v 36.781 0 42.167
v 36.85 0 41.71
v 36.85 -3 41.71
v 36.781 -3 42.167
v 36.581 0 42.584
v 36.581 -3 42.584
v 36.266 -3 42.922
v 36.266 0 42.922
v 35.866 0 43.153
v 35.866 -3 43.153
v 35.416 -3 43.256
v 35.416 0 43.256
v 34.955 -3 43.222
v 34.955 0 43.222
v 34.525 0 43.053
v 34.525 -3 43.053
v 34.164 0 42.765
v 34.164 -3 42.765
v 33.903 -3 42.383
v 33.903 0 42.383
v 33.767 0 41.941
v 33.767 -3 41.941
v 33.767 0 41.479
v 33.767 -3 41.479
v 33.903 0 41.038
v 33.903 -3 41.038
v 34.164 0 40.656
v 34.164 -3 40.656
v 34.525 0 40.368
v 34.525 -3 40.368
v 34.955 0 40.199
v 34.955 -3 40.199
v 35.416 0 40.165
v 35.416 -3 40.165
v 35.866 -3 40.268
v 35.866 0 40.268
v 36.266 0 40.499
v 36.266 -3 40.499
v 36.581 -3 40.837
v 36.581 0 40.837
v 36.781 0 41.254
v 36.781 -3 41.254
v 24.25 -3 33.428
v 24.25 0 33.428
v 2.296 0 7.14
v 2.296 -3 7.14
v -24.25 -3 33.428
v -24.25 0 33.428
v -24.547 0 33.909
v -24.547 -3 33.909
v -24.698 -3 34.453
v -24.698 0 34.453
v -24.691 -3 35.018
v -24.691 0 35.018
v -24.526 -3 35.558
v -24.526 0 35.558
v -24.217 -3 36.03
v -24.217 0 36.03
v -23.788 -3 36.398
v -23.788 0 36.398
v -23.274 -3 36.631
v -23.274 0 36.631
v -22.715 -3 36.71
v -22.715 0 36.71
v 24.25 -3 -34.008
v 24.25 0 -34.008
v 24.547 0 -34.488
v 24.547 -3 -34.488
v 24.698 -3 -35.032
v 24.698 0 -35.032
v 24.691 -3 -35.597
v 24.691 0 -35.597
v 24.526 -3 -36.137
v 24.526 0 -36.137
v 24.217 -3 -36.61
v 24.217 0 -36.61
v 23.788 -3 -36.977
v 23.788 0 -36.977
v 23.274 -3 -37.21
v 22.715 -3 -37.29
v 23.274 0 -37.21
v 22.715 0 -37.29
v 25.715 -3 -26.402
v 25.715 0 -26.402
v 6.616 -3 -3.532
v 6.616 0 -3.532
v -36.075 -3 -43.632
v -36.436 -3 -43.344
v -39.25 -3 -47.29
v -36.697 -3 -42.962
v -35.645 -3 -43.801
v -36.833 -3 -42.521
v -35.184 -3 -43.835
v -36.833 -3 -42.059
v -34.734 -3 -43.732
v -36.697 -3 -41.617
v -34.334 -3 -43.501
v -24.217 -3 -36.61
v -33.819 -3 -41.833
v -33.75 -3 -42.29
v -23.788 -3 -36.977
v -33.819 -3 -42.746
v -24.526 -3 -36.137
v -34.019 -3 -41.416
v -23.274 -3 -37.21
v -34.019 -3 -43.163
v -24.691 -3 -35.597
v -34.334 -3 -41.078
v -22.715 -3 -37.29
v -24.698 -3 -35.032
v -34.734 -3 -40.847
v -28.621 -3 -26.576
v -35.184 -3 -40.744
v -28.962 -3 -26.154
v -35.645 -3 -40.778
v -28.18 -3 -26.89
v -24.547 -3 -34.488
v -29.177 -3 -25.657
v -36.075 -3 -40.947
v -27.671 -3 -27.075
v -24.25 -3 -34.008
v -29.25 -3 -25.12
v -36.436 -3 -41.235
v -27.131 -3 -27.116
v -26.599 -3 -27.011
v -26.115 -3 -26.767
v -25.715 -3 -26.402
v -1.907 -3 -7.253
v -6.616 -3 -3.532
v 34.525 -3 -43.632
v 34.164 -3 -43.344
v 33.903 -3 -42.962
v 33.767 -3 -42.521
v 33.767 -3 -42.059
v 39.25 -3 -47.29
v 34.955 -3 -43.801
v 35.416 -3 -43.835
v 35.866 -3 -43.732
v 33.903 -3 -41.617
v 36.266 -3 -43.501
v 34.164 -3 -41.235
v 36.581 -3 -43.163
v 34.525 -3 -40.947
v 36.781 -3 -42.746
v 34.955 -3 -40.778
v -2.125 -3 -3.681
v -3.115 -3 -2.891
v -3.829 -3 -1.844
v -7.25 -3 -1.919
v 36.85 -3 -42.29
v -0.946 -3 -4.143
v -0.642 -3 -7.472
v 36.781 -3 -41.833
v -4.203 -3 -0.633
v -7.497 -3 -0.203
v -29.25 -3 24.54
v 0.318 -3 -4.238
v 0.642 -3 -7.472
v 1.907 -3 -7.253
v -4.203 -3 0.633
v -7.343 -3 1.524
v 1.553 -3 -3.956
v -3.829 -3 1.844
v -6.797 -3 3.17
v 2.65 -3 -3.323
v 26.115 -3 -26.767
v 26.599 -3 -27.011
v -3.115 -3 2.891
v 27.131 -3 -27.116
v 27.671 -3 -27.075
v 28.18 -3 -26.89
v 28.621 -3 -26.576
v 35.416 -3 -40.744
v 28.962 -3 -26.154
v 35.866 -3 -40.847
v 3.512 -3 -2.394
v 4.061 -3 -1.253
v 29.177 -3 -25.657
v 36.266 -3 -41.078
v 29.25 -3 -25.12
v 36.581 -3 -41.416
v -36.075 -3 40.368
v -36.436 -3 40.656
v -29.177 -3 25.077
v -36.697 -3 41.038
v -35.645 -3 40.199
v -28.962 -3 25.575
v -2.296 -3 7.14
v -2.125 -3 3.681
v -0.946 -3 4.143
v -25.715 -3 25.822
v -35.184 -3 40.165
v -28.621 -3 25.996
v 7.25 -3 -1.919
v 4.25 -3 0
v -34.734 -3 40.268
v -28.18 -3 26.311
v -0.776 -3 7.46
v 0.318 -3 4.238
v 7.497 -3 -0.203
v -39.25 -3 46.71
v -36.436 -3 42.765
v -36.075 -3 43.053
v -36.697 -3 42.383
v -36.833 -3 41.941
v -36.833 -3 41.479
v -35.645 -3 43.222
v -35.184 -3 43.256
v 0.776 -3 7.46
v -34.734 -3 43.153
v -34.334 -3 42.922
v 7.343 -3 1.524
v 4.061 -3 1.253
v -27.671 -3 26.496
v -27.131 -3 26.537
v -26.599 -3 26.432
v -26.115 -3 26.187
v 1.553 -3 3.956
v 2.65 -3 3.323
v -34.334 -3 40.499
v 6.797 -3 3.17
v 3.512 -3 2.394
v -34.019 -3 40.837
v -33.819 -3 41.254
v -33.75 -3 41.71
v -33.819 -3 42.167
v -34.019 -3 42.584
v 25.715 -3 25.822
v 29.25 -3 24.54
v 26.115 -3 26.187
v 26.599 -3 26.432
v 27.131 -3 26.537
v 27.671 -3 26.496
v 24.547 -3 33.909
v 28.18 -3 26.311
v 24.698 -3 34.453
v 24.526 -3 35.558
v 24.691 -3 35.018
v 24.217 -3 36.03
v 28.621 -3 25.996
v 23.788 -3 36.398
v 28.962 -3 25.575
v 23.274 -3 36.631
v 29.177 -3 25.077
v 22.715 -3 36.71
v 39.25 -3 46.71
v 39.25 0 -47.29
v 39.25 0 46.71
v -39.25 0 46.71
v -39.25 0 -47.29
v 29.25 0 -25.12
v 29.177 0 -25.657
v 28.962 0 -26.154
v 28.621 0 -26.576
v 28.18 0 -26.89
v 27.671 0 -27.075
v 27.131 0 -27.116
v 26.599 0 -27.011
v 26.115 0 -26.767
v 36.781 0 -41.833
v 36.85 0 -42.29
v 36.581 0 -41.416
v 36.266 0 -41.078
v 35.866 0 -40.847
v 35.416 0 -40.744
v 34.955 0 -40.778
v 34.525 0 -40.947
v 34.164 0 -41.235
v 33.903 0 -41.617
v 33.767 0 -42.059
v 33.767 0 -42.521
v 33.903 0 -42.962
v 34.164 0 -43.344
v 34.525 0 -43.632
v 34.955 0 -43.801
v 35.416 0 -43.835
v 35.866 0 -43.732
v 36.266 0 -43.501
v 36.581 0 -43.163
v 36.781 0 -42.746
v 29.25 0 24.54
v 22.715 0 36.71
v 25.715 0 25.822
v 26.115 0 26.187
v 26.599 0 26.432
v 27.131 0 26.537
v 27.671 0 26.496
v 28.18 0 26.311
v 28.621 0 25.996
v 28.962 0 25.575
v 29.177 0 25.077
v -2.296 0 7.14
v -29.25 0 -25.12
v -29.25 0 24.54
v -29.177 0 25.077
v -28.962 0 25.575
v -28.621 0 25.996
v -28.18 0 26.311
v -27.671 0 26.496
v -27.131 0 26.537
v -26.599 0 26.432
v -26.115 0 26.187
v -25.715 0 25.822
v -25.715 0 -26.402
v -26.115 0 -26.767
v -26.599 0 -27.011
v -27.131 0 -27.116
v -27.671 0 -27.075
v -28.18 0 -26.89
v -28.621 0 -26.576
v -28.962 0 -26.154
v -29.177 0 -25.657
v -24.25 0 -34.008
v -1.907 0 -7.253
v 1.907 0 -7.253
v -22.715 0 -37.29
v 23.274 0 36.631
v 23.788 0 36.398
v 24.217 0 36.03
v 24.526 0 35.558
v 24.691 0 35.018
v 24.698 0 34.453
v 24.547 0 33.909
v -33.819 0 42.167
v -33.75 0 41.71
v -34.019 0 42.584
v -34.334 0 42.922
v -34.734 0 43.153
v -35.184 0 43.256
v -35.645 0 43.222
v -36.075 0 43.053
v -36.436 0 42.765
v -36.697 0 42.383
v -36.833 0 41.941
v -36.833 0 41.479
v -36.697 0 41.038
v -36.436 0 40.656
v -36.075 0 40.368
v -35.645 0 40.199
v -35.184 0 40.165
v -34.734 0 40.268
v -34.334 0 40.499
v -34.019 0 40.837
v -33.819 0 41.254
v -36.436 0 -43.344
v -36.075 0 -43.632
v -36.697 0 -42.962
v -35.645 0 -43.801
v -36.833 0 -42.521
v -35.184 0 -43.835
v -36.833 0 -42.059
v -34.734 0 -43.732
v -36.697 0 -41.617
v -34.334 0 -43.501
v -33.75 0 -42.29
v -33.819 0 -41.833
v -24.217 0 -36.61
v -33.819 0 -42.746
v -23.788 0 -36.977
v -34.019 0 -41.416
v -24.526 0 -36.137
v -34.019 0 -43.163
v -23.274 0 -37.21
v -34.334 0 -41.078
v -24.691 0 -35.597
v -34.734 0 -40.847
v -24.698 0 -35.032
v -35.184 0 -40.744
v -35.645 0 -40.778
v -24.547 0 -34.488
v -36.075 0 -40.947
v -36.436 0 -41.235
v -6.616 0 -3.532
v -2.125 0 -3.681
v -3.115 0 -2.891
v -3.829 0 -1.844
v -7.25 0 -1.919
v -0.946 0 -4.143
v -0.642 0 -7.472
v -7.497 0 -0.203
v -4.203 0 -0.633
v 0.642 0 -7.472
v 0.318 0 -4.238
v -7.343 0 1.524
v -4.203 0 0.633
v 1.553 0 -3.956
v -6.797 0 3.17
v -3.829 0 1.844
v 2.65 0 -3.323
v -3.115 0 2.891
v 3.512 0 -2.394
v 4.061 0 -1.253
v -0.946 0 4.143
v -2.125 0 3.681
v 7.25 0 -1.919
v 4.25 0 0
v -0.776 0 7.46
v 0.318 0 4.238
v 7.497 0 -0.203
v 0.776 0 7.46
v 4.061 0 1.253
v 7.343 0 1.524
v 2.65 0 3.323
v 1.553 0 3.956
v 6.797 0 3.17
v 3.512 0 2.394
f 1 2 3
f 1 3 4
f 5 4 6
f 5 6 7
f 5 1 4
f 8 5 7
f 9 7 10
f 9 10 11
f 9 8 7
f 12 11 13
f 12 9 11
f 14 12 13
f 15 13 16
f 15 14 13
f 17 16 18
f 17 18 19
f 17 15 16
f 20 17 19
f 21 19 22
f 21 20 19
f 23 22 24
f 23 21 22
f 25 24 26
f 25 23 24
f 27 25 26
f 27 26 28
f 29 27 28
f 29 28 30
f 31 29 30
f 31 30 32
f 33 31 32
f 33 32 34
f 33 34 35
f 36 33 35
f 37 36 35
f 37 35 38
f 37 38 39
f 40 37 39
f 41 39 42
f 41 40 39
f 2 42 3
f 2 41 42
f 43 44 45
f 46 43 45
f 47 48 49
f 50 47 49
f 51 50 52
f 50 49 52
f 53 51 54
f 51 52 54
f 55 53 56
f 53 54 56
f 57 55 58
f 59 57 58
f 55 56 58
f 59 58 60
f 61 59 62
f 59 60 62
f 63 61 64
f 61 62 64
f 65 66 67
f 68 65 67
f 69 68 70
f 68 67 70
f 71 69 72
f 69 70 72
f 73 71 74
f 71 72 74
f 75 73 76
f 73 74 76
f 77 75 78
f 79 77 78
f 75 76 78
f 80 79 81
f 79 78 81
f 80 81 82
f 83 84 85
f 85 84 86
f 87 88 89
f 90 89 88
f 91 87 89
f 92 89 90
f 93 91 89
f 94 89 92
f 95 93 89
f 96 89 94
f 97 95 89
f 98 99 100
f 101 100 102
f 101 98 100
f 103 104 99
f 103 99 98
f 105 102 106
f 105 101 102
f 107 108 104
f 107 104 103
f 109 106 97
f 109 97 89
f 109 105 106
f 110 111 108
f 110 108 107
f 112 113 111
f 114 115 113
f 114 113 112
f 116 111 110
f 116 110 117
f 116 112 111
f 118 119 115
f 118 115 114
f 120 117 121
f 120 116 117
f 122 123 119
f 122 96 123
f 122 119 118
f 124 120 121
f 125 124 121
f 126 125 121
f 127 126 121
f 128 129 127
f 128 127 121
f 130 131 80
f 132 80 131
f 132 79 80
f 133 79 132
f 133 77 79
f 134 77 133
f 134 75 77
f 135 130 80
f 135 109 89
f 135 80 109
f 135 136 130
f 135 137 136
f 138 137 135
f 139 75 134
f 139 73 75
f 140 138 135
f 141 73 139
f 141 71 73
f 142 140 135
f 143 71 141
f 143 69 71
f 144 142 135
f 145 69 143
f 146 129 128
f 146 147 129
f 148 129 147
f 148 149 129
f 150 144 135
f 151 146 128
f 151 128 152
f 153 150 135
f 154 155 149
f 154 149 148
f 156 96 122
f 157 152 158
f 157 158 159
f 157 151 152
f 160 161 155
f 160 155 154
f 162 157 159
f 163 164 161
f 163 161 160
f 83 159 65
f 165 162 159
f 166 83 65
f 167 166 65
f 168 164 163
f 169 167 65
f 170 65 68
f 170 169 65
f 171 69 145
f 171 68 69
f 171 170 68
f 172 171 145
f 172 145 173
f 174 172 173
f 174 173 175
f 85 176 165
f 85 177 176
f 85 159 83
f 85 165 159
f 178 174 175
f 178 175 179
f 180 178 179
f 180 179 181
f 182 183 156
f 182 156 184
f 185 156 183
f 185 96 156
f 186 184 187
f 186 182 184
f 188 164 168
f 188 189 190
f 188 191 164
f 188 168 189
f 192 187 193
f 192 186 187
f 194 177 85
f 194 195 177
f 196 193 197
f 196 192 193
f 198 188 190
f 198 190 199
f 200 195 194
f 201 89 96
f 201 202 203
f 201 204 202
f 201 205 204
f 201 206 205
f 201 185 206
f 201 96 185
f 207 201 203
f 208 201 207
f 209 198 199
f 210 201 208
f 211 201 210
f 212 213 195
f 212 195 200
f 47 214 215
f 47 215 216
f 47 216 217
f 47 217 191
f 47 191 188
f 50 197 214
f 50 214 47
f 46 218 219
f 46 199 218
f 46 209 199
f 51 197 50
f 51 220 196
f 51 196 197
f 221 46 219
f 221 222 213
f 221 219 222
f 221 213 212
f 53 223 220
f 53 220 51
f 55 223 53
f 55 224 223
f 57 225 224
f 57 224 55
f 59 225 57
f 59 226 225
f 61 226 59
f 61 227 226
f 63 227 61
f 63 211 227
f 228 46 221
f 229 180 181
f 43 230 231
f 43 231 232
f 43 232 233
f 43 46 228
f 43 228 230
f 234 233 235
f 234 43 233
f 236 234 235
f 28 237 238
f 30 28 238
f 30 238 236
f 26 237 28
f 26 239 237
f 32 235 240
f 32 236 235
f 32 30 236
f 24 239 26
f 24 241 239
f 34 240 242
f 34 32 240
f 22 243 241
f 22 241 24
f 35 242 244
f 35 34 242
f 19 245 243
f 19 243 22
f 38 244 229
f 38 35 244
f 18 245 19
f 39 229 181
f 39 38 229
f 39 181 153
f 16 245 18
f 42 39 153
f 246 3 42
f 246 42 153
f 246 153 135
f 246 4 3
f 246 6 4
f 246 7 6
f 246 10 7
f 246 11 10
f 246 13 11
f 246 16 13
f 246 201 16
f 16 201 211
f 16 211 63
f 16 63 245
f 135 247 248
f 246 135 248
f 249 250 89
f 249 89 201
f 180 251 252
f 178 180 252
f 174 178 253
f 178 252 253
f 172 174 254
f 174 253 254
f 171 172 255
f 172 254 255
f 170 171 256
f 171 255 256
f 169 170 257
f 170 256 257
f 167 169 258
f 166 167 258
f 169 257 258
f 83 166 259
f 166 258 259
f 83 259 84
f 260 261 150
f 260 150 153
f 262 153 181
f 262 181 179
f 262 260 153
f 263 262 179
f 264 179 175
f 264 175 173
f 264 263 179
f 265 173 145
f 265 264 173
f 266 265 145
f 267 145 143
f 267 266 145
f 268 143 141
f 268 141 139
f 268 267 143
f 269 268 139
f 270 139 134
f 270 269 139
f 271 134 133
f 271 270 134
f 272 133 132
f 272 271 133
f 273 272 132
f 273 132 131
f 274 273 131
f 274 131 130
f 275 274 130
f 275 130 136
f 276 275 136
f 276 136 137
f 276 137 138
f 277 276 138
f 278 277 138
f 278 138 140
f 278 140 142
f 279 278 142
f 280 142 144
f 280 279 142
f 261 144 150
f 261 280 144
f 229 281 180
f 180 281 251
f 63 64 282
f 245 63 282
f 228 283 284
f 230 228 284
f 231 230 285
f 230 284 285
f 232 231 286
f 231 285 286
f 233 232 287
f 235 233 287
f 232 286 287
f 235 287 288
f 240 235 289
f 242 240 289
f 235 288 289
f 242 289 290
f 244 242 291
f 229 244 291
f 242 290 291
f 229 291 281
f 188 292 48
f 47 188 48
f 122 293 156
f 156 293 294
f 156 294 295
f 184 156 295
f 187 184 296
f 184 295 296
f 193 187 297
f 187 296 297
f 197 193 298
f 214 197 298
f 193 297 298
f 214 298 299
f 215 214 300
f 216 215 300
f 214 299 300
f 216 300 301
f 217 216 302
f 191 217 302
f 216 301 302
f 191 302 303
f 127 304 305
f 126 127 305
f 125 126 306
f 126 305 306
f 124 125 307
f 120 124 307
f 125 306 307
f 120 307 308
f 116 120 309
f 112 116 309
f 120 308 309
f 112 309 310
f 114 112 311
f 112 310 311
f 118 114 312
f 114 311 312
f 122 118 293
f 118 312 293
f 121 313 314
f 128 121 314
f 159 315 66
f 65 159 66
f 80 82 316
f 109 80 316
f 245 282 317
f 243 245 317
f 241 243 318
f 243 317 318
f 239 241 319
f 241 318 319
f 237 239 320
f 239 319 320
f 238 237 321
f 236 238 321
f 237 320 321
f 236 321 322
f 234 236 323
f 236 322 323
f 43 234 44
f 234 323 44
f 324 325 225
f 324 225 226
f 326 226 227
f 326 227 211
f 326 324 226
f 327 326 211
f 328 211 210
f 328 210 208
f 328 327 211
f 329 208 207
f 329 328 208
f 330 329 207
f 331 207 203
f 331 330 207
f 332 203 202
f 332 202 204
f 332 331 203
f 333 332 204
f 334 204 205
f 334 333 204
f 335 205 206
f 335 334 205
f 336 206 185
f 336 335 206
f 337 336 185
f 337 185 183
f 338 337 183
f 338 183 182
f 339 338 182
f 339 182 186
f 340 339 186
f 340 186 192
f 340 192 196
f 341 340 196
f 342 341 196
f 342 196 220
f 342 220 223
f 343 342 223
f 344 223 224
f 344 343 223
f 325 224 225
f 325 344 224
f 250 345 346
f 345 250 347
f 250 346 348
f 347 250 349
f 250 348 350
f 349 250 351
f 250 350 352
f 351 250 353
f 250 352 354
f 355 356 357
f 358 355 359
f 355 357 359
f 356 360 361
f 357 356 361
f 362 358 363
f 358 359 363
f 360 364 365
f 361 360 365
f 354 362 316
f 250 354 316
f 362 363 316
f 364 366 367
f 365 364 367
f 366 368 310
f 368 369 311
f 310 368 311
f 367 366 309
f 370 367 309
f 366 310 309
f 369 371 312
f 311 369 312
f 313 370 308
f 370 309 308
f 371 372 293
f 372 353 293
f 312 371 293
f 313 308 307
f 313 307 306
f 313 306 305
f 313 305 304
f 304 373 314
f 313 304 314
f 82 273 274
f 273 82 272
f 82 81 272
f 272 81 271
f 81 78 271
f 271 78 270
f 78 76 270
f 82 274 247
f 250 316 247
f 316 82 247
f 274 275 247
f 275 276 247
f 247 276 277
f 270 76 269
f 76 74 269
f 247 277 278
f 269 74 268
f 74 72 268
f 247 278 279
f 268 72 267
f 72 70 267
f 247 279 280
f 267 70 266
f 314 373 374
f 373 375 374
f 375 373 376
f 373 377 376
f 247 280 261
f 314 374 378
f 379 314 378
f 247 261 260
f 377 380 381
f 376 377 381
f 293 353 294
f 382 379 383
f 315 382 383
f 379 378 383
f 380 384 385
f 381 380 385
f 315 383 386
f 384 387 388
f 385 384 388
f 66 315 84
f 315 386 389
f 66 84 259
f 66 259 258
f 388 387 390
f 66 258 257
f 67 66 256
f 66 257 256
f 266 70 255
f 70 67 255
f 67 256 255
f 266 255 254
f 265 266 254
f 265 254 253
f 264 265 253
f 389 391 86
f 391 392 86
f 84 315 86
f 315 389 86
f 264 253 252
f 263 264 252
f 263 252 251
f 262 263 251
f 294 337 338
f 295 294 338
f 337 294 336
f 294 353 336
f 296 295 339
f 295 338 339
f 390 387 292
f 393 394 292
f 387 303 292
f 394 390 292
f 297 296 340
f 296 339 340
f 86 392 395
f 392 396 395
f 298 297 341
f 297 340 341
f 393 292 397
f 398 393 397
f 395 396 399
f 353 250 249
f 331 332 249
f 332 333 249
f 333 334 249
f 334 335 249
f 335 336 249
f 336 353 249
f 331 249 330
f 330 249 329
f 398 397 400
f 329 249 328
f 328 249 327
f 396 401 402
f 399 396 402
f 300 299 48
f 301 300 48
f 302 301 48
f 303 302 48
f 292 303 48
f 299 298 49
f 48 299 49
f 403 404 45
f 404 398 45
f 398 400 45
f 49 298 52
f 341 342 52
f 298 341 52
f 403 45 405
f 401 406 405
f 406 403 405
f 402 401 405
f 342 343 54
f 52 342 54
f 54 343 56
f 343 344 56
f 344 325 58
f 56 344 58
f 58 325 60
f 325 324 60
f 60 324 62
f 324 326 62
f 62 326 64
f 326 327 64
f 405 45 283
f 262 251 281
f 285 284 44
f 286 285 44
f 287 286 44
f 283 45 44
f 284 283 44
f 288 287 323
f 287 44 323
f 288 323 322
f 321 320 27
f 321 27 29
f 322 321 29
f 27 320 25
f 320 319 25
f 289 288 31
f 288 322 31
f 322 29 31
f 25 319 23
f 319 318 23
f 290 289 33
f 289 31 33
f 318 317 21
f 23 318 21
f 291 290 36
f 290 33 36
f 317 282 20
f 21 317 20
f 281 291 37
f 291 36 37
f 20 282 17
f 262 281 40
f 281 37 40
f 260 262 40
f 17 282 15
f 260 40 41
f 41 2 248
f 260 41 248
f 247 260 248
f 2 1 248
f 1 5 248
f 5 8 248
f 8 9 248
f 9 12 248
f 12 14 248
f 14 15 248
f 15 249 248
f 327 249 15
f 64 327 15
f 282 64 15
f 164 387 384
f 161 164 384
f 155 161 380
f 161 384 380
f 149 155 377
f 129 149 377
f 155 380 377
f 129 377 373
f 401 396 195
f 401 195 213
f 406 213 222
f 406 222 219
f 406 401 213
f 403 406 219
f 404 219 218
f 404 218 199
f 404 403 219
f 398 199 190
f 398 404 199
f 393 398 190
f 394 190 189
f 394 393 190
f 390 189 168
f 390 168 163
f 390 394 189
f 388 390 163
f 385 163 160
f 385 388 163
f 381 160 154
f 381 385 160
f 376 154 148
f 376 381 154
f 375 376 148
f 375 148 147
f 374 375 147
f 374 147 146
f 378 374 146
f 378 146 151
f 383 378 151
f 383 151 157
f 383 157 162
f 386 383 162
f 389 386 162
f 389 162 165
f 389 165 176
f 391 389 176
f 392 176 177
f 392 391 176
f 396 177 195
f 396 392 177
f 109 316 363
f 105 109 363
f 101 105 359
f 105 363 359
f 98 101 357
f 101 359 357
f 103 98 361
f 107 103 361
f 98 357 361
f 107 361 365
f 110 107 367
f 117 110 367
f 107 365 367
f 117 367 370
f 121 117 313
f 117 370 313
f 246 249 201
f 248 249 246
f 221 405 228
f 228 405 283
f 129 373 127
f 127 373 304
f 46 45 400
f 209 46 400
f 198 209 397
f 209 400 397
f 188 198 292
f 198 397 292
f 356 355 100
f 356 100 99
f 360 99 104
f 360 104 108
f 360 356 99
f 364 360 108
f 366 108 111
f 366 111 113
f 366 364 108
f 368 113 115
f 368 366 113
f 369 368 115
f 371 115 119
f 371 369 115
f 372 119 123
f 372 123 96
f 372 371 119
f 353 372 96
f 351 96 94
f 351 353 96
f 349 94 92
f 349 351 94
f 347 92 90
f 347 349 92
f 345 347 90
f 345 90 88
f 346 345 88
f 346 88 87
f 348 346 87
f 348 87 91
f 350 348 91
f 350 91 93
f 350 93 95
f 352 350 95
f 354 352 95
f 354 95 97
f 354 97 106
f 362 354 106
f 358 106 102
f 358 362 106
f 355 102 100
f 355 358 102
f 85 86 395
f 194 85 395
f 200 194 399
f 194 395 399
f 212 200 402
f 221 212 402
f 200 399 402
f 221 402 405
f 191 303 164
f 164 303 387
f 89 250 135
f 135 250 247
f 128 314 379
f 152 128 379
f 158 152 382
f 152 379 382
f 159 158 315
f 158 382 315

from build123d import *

# Parameters (mm, degrees)
F0_W     = 78.5
F0_H     = 94
F0_R     = 1.55
F0_R_2   = 4.25
F1_DEPTH = 3


with BuildPart() as f1:
    # F0 (on Front) → F1 (new body)
    with BuildSketch(Plane.XZ):
        with Locations((0, -0.289606)):
            Rectangle(F0_W, F0_H)
        with Locations((-35.3, -42.289606)):
            Circle(F0_R, mode=Mode.SUBTRACT)
        with Locations((35.3, -42.289606)):
            Circle(F0_R, mode=Mode.SUBTRACT)
        with BuildLine():
            Line((-24.249606, -34.007632), (-1.907053, -7.253492))
            ThreePointArc((-1.907053, -7.253492), (0, -7.5), (1.907053, -7.253492))
            Line((1.907053, -7.253492), (24.249606, -34.007632))
            ThreePointArc((24.249606, -34.007632), (24.526125, -36.13697), (22.714503, -37.289606))
            Line((22.714503, -37.289606), (-22.714503, -37.289606))
            ThreePointArc((-22.714503, -37.289606), (-24.526125, -36.13697), (-24.249606, -34.007632))
        make_face(mode=Mode.SUBTRACT)
        with BuildLine():
            Line((-29.25, -25.119712), (-29.25, 24.540499))
            ThreePointArc((-29.25, 24.540499), (-27.931833, 26.420686), (-25.714897, 25.822474))
            Line((-25.714897, 25.822474), (-6.79733, 3.169591))
            ThreePointArc((-6.79733, 3.169591), (-7.497264, -0.202557), (-6.61627, -3.531993))
            Line((-6.61627, -3.531993), (-25.714897, -26.401686))
            ThreePointArc((-25.714897, -26.401686), (-27.931833, -26.999899), (-29.25, -25.119712))
        make_face(mode=Mode.SUBTRACT)
        with Locations((-35.3, 41.710394)):
            Circle(F0_R, mode=Mode.SUBTRACT)
        Circle(F0_R_2, mode=Mode.SUBTRACT)
        with BuildLine():
            ThreePointArc((6.61627, -3.531993), (7.497264, -0.202557), (6.79733, 3.169591))
            Line((6.79733, 3.169591), (25.714897, 25.822474))
            ThreePointArc((25.714897, 25.822474), (27.931833, 26.420686), (29.25, 24.540499))
            Line((29.25, 24.540499), (29.25, -25.119712))
            ThreePointArc((29.25, -25.119712), (27.931833, -26.999899), (25.714897, -26.401686))
            Line((25.714897, -26.401686), (6.61627, -3.531993))
        make_face(mode=Mode.SUBTRACT)
        with BuildLine():
            ThreePointArc((-24.249606, 33.428419), (-24.526125, 35.557758), (-22.714503, 36.710394))
            Line((-22.714503, 36.710394), (22.714503, 36.710394))
            ThreePointArc((22.714503, 36.710394), (24.526125, 35.557758), (24.249606, 33.428419))
            Line((24.249606, 33.428419), (2.295928, 7.139938))
            ThreePointArc((2.295928, 7.139938), (0, 7.5), (-2.295928, 7.139938))
            Line((-2.295928, 7.139938), (-24.249606, 33.428419))
        make_face(mode=Mode.SUBTRACT)
        with Locations((35.3, 41.710394)):
            Circle(F0_R, mode=Mode.SUBTRACT)
    extrude(amount=F1_DEPTH)


solid = f1.part
